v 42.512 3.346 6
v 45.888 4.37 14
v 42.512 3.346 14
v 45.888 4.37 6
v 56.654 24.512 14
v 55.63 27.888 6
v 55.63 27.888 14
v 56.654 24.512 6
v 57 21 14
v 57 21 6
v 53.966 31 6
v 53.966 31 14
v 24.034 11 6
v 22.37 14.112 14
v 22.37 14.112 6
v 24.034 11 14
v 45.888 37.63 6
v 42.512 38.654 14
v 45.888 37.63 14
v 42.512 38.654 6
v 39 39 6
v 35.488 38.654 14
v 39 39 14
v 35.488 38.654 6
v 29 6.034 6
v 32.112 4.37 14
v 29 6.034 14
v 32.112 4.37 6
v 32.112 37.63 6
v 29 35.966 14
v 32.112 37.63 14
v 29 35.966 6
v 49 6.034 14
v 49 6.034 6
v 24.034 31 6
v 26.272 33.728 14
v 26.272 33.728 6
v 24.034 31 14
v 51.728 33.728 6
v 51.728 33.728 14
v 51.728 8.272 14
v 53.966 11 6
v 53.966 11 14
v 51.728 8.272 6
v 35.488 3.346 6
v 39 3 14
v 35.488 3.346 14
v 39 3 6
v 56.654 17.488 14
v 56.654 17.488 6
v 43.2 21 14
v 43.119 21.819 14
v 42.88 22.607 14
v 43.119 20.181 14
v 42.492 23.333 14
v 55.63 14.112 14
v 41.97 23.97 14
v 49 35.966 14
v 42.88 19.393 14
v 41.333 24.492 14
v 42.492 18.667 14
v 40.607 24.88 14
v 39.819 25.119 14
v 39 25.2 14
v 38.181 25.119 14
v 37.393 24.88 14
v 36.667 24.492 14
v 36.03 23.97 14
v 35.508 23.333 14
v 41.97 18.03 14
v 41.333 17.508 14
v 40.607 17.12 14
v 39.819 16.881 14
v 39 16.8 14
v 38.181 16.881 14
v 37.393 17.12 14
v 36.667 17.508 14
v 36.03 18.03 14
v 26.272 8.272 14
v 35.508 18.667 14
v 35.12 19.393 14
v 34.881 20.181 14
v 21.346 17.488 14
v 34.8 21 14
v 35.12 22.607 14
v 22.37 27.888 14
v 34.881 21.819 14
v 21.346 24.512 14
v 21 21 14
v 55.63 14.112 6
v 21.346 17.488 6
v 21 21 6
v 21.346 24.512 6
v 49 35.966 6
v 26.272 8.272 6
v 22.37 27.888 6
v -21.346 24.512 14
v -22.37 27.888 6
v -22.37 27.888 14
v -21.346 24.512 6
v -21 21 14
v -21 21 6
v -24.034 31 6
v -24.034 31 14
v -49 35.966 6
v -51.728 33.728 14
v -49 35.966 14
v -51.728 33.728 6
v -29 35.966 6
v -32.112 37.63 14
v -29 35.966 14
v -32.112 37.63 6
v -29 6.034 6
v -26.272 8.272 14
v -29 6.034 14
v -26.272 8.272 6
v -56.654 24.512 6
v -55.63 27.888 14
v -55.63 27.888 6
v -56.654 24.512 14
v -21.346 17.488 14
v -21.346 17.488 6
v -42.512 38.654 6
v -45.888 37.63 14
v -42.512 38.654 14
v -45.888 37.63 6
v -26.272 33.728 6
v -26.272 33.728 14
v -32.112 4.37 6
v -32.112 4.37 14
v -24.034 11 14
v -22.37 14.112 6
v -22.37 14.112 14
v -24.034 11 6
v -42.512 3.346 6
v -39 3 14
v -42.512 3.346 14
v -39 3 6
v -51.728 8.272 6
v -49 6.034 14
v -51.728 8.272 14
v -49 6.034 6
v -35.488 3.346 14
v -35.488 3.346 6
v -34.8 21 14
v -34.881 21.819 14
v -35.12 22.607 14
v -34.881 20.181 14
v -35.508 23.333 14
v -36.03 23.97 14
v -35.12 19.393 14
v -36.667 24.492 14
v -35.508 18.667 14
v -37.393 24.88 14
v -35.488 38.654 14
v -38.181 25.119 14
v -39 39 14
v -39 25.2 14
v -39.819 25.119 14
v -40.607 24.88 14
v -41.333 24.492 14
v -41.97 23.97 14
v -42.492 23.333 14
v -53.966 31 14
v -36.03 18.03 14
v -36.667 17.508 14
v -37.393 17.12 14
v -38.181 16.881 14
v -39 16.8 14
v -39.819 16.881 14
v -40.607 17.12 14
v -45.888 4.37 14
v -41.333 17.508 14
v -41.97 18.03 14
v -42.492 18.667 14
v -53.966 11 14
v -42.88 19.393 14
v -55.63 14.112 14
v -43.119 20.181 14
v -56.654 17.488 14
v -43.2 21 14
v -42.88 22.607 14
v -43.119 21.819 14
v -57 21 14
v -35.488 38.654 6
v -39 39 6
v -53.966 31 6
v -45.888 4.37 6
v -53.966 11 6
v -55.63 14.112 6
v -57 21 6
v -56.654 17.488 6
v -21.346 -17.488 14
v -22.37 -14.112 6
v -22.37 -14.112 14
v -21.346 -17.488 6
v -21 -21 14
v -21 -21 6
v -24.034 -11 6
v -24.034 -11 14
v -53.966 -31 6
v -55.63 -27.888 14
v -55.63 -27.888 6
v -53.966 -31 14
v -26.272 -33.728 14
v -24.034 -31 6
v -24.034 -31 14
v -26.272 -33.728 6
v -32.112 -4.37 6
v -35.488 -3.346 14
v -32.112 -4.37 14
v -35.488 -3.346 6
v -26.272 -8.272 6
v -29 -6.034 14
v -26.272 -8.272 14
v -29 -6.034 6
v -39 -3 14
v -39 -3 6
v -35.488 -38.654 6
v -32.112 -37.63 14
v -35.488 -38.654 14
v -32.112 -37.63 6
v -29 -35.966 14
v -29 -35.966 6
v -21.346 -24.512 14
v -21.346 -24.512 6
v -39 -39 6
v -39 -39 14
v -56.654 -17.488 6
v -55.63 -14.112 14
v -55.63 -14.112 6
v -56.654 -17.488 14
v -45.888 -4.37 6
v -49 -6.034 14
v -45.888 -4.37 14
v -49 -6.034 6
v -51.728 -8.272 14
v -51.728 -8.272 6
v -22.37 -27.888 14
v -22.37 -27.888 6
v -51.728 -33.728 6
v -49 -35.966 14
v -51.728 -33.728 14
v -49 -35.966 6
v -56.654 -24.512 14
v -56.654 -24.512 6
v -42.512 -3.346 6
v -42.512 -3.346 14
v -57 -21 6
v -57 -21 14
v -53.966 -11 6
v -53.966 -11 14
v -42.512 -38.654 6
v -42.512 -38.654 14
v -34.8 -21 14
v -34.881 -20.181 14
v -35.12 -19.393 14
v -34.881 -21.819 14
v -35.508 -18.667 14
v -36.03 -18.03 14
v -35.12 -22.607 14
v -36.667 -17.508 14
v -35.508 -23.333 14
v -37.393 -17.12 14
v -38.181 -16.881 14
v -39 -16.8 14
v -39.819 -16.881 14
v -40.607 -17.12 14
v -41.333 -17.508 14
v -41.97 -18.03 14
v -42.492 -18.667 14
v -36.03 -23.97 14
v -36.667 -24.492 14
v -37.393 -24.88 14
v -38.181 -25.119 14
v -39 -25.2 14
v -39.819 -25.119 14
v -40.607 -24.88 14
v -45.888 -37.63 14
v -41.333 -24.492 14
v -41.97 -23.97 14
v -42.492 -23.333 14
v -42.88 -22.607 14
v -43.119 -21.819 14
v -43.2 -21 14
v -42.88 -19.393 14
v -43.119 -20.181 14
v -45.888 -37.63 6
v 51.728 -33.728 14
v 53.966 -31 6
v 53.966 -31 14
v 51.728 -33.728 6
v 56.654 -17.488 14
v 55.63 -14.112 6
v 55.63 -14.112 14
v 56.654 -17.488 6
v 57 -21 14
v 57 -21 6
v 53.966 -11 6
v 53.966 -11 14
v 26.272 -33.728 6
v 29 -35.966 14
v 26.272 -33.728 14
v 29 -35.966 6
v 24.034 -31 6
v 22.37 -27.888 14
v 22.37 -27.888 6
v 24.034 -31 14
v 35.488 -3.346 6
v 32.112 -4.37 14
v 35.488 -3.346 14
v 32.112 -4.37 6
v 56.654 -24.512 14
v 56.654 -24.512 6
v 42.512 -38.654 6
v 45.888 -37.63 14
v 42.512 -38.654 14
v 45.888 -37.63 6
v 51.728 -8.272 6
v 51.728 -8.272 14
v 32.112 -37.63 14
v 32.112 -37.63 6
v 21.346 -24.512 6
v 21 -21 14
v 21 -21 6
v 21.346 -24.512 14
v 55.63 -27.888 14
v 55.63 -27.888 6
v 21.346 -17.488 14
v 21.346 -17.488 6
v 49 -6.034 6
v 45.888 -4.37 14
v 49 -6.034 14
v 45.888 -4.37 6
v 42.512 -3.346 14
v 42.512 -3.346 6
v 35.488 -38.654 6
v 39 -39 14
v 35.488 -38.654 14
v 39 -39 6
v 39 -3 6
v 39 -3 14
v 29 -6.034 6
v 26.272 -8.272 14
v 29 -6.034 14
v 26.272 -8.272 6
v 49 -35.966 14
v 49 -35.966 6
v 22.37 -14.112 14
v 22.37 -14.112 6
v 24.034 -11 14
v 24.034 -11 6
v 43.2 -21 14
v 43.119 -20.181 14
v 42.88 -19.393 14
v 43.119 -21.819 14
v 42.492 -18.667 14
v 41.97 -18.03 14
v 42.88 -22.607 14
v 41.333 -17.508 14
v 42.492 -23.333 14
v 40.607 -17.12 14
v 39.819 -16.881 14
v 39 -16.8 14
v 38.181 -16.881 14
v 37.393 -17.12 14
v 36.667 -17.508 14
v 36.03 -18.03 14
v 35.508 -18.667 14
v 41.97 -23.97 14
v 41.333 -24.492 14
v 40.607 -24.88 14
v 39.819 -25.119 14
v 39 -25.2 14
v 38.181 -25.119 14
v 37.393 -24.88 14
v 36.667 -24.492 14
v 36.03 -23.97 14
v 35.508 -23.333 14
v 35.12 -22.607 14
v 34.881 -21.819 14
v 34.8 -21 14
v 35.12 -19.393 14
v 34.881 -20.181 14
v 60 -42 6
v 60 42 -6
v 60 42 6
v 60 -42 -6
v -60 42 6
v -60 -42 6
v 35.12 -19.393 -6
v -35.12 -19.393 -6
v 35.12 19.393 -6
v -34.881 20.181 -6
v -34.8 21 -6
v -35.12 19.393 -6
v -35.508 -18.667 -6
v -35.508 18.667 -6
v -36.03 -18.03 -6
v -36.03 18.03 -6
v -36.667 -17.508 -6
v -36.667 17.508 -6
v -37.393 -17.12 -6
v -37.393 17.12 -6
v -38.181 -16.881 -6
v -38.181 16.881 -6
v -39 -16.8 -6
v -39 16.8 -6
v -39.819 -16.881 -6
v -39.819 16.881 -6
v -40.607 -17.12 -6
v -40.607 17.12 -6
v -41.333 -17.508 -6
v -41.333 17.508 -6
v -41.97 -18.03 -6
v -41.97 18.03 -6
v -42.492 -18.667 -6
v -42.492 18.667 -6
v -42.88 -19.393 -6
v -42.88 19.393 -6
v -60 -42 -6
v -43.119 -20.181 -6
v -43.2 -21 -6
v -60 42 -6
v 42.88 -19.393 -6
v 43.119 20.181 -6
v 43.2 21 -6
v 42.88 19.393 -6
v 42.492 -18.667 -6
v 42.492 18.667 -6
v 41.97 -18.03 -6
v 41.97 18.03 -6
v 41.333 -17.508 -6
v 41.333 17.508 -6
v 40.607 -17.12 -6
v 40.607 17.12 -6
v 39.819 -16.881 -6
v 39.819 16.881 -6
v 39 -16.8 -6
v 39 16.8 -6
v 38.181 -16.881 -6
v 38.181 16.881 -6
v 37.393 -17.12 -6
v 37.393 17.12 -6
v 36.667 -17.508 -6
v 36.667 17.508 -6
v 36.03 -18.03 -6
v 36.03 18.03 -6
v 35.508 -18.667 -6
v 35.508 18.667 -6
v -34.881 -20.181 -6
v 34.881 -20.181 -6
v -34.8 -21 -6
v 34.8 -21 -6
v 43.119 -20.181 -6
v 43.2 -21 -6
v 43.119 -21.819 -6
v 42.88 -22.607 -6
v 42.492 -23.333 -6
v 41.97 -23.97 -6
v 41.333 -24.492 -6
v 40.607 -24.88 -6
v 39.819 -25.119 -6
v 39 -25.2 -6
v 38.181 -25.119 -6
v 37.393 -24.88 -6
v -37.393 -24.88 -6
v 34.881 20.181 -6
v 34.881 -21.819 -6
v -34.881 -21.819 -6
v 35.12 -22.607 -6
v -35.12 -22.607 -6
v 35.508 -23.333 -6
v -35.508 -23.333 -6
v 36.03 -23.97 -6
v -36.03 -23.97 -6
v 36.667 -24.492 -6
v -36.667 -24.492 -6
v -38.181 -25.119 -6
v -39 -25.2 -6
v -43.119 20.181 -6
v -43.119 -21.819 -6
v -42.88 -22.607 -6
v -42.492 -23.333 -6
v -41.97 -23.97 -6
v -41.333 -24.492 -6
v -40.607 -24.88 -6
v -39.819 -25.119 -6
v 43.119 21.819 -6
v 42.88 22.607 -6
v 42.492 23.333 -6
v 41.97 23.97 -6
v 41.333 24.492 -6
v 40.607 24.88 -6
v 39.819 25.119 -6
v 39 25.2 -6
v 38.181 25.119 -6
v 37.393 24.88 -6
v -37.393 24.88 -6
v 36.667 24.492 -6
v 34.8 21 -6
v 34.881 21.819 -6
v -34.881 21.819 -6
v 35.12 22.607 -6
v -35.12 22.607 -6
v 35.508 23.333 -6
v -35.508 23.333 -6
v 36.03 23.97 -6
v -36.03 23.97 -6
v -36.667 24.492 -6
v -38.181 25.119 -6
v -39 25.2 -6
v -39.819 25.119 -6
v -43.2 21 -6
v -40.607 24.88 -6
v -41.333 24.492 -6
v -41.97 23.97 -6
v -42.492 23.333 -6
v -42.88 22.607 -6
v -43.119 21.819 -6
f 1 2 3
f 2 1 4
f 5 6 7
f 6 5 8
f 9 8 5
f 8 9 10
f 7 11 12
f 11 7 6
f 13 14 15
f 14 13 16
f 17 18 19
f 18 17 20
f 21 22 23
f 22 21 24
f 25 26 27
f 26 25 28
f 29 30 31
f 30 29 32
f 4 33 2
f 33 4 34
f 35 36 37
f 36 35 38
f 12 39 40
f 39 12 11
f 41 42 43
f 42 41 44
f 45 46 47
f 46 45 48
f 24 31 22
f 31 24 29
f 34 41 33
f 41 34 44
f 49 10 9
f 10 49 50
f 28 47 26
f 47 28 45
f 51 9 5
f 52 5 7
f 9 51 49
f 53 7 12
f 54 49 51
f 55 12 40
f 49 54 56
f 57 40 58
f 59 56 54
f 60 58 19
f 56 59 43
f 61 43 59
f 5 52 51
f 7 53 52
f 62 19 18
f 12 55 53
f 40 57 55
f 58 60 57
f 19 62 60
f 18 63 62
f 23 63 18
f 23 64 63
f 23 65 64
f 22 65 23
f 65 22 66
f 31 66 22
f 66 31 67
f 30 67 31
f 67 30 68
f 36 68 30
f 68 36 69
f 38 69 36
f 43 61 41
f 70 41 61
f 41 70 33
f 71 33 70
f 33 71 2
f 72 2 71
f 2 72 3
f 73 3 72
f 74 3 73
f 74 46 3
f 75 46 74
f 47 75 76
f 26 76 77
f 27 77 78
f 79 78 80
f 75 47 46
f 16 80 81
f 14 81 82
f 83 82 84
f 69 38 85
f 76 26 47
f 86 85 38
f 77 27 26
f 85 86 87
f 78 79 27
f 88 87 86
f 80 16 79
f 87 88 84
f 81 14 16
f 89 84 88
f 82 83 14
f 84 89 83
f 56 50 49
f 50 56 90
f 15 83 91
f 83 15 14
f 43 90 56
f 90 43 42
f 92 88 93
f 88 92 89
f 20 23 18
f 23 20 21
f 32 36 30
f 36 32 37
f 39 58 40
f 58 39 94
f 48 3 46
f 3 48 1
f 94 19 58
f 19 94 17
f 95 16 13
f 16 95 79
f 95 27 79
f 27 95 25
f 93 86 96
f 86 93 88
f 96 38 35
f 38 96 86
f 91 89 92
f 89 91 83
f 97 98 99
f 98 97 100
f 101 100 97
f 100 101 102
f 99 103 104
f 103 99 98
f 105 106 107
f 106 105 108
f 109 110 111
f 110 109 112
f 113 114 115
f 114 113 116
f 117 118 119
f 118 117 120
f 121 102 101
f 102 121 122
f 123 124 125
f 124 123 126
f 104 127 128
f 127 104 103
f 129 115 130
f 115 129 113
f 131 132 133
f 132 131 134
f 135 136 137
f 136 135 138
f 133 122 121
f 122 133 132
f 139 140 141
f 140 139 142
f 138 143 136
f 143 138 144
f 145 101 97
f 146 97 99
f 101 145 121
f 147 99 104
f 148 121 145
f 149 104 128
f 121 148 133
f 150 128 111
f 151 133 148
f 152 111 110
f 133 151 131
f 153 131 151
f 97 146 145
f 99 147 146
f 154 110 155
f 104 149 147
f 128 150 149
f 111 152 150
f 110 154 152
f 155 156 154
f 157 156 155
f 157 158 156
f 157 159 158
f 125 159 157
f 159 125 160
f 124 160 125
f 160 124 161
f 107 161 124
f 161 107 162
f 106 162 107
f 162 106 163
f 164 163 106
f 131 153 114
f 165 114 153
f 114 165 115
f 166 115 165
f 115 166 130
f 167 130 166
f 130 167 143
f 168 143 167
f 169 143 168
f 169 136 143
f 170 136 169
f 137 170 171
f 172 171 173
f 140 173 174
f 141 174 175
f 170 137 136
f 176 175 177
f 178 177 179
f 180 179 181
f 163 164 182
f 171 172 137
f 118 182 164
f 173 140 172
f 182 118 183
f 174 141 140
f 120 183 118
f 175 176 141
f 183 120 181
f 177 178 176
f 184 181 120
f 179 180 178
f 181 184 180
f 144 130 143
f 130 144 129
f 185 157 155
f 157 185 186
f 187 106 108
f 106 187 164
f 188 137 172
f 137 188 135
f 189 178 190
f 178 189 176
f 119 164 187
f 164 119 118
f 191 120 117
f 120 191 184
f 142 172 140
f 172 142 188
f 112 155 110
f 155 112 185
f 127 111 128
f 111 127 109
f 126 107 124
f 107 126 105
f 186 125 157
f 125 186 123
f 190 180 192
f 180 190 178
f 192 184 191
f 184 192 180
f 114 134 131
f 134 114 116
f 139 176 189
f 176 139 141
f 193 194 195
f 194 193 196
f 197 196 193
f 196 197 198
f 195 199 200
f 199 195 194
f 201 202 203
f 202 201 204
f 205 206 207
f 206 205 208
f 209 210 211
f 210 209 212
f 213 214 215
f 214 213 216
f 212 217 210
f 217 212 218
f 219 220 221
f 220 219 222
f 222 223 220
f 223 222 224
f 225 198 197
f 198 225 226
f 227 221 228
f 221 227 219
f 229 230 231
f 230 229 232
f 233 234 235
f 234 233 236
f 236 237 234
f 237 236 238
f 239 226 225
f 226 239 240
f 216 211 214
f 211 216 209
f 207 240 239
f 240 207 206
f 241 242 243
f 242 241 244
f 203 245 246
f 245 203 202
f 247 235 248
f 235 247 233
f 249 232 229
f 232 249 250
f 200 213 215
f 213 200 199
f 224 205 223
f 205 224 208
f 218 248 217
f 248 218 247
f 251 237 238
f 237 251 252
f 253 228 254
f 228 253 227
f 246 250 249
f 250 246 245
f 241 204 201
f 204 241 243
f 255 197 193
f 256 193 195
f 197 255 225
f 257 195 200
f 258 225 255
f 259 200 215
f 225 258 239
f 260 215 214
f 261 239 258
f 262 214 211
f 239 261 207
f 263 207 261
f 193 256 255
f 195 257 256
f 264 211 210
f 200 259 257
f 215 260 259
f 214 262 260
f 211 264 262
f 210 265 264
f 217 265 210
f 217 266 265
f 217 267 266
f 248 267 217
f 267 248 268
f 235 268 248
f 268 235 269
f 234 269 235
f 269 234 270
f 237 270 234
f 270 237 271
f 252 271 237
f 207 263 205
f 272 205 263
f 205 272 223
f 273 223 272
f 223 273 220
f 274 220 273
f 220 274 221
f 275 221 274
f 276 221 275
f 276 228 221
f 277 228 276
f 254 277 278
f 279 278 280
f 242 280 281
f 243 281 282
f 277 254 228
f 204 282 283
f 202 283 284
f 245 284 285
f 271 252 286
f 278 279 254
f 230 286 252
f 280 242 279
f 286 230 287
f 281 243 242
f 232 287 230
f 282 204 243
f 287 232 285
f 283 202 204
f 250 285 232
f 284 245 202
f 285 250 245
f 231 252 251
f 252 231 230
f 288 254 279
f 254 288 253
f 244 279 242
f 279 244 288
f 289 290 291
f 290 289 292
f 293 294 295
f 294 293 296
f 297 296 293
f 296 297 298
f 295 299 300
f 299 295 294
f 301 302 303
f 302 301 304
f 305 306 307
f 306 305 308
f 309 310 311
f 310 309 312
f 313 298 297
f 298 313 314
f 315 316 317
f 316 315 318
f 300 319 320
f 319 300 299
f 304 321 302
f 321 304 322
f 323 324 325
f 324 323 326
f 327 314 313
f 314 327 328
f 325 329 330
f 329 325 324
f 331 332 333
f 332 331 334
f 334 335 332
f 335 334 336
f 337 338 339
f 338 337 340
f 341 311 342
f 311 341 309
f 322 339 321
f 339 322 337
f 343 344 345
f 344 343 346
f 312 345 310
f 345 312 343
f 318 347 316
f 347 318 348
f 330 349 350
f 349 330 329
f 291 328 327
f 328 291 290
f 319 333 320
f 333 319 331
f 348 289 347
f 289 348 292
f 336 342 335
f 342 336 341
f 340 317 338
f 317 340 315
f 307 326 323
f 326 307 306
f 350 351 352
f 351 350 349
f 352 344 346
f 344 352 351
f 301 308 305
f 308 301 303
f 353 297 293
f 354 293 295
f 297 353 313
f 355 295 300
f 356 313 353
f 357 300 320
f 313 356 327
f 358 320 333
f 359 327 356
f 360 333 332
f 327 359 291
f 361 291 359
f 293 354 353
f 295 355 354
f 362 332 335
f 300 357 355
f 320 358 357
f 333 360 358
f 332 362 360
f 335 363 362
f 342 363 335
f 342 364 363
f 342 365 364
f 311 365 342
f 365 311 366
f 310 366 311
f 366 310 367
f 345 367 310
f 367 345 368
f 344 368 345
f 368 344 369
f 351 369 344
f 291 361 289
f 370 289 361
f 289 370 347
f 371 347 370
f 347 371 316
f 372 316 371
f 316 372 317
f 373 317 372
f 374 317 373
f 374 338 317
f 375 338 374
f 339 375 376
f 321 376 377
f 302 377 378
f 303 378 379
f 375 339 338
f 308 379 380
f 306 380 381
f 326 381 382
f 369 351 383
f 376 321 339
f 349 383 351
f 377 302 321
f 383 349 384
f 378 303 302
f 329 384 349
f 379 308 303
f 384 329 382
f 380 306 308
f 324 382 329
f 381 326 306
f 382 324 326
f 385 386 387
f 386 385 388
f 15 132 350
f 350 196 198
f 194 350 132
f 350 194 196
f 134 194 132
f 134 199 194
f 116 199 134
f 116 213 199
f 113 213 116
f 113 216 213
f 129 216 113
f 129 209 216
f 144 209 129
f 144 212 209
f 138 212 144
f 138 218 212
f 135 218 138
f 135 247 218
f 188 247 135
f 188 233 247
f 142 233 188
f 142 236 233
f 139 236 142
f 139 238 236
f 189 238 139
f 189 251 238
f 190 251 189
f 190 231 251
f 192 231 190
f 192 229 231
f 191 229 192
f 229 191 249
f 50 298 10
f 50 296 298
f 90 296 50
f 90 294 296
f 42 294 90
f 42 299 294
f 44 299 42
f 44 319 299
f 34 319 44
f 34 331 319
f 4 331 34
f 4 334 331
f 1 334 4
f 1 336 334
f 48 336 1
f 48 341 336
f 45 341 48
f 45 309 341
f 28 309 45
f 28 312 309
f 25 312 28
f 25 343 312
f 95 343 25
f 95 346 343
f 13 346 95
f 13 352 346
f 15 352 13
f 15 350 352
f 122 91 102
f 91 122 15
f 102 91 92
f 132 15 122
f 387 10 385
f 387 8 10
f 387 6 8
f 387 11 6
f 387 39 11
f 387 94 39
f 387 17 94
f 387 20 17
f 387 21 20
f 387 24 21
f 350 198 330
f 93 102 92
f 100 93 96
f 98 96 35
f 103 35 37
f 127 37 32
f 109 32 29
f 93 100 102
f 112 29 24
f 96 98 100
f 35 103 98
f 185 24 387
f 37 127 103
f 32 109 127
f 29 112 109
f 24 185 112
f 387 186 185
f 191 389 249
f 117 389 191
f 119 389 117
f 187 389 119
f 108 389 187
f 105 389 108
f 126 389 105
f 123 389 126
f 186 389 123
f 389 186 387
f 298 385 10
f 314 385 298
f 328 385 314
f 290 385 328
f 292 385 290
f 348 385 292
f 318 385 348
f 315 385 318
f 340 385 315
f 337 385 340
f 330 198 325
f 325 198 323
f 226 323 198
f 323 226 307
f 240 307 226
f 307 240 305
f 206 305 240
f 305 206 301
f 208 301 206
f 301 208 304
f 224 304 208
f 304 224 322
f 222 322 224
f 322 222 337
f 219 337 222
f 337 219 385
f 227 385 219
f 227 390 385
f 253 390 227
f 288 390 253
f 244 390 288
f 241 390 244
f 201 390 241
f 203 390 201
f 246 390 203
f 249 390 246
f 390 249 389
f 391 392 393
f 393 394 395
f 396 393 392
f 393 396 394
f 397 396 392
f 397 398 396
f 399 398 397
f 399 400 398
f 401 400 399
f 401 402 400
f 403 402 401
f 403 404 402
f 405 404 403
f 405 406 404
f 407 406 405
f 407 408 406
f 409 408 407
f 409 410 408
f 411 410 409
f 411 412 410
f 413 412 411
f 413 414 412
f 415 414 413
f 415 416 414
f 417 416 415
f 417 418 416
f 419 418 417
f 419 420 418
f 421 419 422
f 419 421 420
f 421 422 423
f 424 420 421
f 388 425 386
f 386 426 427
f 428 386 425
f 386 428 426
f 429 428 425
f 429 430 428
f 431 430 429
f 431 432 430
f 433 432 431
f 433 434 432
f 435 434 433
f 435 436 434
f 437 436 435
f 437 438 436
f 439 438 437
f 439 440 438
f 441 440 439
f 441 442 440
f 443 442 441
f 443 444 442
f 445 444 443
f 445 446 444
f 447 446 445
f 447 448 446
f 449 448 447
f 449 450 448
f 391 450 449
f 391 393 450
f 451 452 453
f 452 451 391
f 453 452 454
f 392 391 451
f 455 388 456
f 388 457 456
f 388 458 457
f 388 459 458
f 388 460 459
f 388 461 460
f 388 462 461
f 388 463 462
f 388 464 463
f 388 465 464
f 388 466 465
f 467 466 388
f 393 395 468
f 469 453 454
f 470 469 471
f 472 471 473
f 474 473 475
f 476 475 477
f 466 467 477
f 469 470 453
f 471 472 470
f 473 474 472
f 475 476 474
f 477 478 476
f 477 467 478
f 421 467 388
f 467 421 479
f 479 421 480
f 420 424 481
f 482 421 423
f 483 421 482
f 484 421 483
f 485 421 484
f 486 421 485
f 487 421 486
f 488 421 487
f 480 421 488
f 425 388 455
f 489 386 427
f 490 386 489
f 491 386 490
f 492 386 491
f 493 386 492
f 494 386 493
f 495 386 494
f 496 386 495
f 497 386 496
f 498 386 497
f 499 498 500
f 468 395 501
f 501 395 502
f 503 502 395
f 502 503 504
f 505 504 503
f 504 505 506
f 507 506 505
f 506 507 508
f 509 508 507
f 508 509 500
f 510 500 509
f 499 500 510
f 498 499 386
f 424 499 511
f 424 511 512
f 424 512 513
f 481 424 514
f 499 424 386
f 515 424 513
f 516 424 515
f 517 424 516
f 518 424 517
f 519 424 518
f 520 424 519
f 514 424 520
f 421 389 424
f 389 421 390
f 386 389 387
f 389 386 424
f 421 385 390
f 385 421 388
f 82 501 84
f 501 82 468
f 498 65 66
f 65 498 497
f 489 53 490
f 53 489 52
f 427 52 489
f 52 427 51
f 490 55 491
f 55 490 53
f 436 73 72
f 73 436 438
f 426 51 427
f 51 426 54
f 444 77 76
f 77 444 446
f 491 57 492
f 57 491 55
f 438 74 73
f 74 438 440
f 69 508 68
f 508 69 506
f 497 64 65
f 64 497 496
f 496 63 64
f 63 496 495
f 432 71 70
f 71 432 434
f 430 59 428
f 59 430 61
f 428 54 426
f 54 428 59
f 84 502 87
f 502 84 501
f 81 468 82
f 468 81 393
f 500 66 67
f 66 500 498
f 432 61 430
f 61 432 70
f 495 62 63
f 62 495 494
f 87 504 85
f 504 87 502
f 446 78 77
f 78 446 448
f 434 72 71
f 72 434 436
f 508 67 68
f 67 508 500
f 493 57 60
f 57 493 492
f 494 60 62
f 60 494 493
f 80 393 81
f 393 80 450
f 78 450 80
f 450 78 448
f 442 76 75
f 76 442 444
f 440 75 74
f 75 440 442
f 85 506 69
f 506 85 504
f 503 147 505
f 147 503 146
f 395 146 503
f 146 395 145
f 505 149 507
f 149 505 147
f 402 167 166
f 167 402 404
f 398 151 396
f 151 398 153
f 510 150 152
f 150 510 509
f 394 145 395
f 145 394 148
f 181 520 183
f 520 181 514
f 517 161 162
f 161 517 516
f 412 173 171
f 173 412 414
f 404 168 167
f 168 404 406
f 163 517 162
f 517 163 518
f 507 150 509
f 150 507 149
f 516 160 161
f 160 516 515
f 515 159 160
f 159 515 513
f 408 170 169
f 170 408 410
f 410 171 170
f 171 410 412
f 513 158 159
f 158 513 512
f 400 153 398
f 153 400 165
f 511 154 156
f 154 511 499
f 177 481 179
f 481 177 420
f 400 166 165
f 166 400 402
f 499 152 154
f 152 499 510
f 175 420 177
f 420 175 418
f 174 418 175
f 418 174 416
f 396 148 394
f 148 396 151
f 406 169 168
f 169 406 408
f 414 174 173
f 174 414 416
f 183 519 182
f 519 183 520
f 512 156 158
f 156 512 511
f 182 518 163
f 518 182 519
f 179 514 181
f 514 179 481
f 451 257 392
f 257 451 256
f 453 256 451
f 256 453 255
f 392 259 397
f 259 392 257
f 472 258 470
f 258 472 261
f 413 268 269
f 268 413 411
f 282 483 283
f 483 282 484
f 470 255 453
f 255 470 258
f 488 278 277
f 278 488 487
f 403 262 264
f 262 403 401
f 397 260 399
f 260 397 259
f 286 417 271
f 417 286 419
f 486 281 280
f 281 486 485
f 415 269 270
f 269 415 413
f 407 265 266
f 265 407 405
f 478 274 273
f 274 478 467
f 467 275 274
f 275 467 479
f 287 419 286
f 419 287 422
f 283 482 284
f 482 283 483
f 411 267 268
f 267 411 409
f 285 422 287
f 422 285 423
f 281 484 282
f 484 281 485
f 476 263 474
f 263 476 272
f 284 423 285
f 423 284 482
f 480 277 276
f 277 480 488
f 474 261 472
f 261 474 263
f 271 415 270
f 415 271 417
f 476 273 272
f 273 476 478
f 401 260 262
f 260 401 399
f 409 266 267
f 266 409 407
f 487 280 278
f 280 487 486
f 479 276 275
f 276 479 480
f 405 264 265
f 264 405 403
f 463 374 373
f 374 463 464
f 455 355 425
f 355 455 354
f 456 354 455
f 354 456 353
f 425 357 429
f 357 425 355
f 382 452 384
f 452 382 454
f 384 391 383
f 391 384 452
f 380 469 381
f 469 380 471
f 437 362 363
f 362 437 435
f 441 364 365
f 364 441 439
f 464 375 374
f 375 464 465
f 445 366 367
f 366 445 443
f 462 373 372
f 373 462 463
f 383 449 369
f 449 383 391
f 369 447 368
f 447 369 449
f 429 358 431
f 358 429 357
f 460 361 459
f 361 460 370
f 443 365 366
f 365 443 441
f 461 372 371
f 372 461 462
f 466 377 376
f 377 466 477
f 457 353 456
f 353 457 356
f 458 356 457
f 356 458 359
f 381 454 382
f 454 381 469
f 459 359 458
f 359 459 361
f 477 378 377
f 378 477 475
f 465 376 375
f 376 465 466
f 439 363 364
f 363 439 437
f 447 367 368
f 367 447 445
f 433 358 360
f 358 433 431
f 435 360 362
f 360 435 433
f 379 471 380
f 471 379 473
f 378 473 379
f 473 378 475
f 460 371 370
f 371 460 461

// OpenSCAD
$fn = 32;

// ----------------------------------------------------------------------
// Anchor pads 120 x 84 x 20
// four corner bosses with anchor holes
// ----------------------------------------------------------------------

// --- parameters (mm) ---
plate = [120, 84, 12];  // base plate size (x, y, z)
pads = 4;               // boss count, one per corner
edge = 21;              // boss centre offset from the plate edge
boss_d = 36;            // boss diameter
boss_h = 8;             // boss height above the base plate
hole_d = 8.4;           // hole diameter

// --- derived feature positions (mm) ---
height = plate[2] + boss_h;      // = 20   overall height of the part
corner_x = plate[0] / 2 - edge;  // = 39   boss centre X
corner_y = plate[1] / 2 - edge;  // = 21   boss centre Y
feature_centers = [
  [corner_x, corner_y],
  [-corner_x, corner_y],
  [-corner_x, -corner_y],
  [corner_x, -corner_y]
];   // boss centres, anchor holes are drilled there

// base plate, four bosses standing on it, anchor holes all the way through
difference() {
  union() {
    cube(plate, center = true);
    for (centre = feature_centers)
      translate([centre[0], centre[1], plate[2] / 2 - 1])
        cylinder(d = boss_d, h = boss_h + 1);
  }
  for (centre = feature_centers)
    translate([centre[0], centre[1], -height])
      cylinder(d = hole_d, h = 2 * height + 2);  // through boss and plate
}
